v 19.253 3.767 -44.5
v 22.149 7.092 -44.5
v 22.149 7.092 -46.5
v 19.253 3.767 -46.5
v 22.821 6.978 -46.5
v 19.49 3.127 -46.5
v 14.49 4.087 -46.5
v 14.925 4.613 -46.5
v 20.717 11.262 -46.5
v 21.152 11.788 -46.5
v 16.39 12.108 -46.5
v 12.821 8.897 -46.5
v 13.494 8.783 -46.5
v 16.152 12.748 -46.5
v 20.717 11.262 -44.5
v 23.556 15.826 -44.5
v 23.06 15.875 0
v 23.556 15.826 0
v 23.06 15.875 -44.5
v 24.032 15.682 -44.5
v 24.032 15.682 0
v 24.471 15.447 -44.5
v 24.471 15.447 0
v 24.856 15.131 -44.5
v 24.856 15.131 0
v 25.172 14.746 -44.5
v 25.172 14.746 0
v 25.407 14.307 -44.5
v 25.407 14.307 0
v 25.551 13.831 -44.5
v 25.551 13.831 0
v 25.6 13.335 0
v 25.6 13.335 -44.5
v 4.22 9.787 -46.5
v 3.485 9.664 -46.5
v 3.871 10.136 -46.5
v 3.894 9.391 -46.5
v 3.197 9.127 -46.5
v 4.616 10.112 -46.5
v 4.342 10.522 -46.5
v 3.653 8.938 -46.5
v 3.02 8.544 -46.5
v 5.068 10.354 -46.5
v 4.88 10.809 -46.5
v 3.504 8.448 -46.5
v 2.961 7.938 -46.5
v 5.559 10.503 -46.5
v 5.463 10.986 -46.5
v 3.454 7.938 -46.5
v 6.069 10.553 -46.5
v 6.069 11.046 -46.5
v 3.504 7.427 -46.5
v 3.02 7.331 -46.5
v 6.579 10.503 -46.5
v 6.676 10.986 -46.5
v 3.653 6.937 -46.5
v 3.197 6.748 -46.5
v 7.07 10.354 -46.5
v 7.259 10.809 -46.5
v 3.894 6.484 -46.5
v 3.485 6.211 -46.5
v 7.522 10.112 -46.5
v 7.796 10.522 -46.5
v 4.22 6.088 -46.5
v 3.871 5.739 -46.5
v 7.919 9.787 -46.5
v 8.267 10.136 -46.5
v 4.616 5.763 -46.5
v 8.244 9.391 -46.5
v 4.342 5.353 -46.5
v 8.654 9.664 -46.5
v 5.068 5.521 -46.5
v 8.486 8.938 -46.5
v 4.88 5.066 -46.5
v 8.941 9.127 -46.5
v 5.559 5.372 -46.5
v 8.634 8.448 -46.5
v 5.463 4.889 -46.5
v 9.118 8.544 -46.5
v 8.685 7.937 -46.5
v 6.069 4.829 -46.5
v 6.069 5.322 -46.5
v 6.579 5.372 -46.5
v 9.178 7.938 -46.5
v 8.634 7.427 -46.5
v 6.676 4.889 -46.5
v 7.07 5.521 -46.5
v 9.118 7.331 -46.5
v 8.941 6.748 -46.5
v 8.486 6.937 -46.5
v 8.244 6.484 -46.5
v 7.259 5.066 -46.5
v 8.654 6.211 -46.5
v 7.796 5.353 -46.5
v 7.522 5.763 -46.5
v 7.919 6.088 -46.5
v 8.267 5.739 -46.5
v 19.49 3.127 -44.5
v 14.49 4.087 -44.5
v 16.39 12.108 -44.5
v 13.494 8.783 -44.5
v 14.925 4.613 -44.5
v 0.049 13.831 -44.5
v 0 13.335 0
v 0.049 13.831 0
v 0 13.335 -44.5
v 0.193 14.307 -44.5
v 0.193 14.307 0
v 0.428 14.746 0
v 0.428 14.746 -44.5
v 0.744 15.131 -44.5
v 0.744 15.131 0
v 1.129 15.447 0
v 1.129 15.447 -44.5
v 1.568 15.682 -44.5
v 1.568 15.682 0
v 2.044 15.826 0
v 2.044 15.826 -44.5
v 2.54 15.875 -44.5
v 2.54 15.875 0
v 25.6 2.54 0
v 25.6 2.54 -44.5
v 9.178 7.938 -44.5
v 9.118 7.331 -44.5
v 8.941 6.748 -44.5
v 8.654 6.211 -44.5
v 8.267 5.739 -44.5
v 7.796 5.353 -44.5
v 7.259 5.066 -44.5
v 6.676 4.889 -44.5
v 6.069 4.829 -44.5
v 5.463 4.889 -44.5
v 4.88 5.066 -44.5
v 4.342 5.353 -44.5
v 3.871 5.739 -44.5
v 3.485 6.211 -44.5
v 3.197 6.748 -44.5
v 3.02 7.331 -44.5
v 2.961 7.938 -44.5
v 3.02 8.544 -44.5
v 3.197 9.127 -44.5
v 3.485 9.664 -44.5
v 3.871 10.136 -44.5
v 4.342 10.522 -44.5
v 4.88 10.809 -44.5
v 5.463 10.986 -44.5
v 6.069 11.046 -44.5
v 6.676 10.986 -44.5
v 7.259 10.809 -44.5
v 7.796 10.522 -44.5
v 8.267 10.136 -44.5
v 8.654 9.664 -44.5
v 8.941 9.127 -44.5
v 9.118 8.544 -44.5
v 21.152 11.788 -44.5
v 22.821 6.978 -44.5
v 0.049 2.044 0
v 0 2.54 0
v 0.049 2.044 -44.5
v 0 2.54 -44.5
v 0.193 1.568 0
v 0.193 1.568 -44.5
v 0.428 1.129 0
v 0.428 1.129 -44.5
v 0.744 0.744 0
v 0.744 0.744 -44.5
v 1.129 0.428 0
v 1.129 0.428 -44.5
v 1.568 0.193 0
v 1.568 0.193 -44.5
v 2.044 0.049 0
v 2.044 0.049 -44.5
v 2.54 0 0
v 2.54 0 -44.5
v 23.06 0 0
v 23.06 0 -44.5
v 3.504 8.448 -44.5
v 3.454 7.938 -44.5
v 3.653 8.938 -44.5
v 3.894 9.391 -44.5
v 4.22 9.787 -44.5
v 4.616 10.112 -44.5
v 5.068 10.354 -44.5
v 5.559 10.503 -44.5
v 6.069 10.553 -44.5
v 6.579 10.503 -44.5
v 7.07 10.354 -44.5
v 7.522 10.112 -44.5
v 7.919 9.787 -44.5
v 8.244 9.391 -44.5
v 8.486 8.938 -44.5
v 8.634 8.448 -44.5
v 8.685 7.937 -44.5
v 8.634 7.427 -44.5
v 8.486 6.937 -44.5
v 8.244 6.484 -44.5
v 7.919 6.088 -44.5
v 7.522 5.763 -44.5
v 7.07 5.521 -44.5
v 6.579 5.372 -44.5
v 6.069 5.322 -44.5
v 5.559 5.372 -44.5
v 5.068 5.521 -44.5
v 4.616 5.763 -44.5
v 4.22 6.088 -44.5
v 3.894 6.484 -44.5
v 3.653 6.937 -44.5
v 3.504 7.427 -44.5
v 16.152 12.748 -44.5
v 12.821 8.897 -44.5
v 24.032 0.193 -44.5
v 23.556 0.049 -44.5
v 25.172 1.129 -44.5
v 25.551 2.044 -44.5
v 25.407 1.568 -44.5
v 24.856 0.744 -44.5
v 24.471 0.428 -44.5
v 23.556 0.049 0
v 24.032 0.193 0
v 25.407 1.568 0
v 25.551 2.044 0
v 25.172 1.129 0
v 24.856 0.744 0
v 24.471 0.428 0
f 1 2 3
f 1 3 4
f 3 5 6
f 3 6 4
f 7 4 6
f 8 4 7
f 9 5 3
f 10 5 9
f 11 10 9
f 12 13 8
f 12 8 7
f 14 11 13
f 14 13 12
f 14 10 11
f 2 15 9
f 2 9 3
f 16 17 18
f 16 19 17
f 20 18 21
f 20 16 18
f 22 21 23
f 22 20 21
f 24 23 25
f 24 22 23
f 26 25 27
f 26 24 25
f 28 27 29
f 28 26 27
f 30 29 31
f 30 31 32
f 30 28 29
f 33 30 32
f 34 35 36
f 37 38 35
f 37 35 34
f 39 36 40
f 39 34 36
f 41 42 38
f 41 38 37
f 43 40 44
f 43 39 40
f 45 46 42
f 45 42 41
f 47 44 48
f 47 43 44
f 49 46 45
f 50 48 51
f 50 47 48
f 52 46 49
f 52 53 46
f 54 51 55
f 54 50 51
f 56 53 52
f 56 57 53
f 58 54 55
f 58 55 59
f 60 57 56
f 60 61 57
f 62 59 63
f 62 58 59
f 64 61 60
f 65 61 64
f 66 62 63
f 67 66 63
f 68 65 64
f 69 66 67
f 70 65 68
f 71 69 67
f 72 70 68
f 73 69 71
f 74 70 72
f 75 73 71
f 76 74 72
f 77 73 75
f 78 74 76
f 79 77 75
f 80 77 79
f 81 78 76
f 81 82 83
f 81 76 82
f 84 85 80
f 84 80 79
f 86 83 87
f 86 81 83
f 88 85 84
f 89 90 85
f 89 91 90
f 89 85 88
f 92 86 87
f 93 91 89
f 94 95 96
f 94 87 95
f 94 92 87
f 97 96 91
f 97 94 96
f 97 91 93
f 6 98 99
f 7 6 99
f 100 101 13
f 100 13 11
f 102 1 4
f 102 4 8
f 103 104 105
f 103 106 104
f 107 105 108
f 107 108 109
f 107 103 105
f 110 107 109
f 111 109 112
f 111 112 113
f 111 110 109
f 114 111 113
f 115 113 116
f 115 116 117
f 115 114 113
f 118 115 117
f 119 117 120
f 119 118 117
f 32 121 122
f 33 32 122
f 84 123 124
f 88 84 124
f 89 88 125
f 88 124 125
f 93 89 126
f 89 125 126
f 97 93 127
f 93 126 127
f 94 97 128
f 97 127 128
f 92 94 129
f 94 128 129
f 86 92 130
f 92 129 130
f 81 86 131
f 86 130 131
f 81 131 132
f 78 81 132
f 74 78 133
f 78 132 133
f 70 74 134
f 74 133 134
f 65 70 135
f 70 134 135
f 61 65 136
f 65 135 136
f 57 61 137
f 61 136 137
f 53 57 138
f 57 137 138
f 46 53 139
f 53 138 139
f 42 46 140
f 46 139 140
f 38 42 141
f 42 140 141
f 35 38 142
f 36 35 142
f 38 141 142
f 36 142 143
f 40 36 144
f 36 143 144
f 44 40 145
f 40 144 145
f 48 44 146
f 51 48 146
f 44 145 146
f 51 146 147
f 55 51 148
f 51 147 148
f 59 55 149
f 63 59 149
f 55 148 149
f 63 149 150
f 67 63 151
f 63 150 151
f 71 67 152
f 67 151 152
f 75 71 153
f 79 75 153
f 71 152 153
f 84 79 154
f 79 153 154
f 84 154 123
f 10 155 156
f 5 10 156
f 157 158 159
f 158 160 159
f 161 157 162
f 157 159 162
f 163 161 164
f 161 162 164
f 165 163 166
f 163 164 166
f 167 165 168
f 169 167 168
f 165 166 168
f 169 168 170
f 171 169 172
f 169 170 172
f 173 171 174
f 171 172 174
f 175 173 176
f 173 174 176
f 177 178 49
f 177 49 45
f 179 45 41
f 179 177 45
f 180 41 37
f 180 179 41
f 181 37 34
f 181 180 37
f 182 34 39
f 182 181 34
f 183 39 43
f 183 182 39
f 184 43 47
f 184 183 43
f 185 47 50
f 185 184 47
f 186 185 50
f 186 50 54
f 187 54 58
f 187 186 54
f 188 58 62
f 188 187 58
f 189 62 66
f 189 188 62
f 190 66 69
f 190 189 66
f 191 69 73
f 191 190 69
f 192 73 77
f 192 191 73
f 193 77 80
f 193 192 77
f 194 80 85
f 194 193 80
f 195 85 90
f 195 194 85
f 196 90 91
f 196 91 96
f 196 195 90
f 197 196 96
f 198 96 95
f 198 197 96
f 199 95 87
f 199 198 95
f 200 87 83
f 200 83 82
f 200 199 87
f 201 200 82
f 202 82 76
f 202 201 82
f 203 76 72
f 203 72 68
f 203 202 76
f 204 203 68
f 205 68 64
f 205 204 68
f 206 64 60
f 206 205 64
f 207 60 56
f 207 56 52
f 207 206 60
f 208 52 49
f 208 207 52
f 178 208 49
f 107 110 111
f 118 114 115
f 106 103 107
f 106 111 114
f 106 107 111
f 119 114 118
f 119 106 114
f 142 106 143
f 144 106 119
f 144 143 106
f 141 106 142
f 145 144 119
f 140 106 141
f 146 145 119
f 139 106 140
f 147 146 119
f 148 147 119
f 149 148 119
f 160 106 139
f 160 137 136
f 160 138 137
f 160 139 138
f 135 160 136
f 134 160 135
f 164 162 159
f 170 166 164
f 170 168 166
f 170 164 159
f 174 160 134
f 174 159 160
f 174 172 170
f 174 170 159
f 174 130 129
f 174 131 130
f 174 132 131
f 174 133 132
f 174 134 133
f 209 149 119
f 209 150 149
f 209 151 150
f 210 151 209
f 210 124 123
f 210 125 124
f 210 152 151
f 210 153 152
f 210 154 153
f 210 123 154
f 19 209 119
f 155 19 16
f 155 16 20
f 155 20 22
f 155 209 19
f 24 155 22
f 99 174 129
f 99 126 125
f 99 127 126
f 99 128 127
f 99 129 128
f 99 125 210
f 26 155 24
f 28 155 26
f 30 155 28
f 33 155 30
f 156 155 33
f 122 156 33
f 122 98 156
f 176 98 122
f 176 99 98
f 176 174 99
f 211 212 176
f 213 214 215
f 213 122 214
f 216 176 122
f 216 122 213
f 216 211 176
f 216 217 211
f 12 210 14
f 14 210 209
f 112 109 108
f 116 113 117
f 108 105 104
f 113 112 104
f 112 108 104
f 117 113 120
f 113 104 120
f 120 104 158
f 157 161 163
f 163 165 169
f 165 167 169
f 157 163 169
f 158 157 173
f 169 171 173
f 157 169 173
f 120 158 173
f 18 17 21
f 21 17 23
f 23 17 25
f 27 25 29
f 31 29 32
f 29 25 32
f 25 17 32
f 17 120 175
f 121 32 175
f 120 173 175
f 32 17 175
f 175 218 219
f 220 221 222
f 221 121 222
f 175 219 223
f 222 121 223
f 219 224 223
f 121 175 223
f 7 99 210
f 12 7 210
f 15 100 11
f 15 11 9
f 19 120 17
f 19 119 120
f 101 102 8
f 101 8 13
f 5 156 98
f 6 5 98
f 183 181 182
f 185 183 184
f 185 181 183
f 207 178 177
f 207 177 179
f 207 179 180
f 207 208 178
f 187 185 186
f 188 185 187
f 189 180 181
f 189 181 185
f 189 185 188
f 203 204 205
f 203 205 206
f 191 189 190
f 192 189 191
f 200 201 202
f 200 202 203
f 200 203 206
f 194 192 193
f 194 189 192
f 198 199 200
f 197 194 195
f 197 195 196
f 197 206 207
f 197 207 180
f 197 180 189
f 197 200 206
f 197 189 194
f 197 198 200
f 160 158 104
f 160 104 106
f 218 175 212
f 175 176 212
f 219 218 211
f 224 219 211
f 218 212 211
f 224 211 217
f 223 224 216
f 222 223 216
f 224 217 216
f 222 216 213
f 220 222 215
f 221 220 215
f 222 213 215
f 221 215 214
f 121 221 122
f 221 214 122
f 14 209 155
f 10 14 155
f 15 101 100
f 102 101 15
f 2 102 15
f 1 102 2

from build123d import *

# Parameters (mm, degrees)
SKETCH1_W           = 25.6
SKETCH1_H           = 44.5
BOSS_EXTRUDE1_DEPTH = 15.875
SKETCH2_R           = 3.108453975
SKETCH2_R_2         = 2.615573074
BOSS_EXTRUDE2_DEPTH = 2
FILLET1_R           = 2.54


with BuildPart() as part:
    # Sketch1 → Boss-Extrude1 (new body)
    with BuildSketch(Plane(origin=(0, 0, 0), x_dir=(1, 0, 0), z_dir=(0, 1, 0))):
        with Locations((12.8, 22.25)):
            Rectangle(SKETCH1_W, SKETCH1_H)
    extrude(amount=BOSS_EXTRUDE1_DEPTH)

    # Sketch2 → Boss-Extrude2 (add)
    # profile 1 of 2: a face of its own
    with BuildSketch(Plane(origin=(0, 0, -44.5), x_dir=(-1, 0, 0), z_dir=(0, 0, -1))):
        with Locations(Location((-6.0691761, 7.9375, 0), (0, 0, 180))):
            Circle(SKETCH2_R)
        with Locations((-6.0691761, 7.9375)):
            Circle(SKETCH2_R_2, mode=Mode.SUBTRACT)
    # profile 2 of 2: a face of its own
    with BuildSketch(Plane(origin=(0, 0, -44.5), x_dir=(-1, 0, 0), z_dir=(0, 0, -1))):
        Polygon((-19.490234753, 3.127434709), (-14.490131947, 4.087133188), (-12.821203807, 8.897198479), (-16.152378472, 12.747565291), (-21.152481278, 11.787866812), (-22.821409419, 6.977801521), align=None)
        Polygon((-19.252657716, 3.767035883), (-14.925254294, 4.612681525), (-13.493903191, 8.783145641), (-16.38995551, 12.107964117), (-20.717358932, 11.262318475), (-22.148710035, 7.091854359), align=None, mode=Mode.SUBTRACT)
    extrude(amount=BOSS_EXTRUDE2_DEPTH)

    # Fillet1
    fillet1_edges = [part.edges().sort_by_distance(p)[0] for p in [
        (25.6, 15.875, -22.25),
        (0, 15.875, -22.25),
        (25.6, 0, -22.25),
        (0, 0, -22.25),
    ]]
    fillet(fillet1_edges, radius=FILLET1_R)


solid = part.part
